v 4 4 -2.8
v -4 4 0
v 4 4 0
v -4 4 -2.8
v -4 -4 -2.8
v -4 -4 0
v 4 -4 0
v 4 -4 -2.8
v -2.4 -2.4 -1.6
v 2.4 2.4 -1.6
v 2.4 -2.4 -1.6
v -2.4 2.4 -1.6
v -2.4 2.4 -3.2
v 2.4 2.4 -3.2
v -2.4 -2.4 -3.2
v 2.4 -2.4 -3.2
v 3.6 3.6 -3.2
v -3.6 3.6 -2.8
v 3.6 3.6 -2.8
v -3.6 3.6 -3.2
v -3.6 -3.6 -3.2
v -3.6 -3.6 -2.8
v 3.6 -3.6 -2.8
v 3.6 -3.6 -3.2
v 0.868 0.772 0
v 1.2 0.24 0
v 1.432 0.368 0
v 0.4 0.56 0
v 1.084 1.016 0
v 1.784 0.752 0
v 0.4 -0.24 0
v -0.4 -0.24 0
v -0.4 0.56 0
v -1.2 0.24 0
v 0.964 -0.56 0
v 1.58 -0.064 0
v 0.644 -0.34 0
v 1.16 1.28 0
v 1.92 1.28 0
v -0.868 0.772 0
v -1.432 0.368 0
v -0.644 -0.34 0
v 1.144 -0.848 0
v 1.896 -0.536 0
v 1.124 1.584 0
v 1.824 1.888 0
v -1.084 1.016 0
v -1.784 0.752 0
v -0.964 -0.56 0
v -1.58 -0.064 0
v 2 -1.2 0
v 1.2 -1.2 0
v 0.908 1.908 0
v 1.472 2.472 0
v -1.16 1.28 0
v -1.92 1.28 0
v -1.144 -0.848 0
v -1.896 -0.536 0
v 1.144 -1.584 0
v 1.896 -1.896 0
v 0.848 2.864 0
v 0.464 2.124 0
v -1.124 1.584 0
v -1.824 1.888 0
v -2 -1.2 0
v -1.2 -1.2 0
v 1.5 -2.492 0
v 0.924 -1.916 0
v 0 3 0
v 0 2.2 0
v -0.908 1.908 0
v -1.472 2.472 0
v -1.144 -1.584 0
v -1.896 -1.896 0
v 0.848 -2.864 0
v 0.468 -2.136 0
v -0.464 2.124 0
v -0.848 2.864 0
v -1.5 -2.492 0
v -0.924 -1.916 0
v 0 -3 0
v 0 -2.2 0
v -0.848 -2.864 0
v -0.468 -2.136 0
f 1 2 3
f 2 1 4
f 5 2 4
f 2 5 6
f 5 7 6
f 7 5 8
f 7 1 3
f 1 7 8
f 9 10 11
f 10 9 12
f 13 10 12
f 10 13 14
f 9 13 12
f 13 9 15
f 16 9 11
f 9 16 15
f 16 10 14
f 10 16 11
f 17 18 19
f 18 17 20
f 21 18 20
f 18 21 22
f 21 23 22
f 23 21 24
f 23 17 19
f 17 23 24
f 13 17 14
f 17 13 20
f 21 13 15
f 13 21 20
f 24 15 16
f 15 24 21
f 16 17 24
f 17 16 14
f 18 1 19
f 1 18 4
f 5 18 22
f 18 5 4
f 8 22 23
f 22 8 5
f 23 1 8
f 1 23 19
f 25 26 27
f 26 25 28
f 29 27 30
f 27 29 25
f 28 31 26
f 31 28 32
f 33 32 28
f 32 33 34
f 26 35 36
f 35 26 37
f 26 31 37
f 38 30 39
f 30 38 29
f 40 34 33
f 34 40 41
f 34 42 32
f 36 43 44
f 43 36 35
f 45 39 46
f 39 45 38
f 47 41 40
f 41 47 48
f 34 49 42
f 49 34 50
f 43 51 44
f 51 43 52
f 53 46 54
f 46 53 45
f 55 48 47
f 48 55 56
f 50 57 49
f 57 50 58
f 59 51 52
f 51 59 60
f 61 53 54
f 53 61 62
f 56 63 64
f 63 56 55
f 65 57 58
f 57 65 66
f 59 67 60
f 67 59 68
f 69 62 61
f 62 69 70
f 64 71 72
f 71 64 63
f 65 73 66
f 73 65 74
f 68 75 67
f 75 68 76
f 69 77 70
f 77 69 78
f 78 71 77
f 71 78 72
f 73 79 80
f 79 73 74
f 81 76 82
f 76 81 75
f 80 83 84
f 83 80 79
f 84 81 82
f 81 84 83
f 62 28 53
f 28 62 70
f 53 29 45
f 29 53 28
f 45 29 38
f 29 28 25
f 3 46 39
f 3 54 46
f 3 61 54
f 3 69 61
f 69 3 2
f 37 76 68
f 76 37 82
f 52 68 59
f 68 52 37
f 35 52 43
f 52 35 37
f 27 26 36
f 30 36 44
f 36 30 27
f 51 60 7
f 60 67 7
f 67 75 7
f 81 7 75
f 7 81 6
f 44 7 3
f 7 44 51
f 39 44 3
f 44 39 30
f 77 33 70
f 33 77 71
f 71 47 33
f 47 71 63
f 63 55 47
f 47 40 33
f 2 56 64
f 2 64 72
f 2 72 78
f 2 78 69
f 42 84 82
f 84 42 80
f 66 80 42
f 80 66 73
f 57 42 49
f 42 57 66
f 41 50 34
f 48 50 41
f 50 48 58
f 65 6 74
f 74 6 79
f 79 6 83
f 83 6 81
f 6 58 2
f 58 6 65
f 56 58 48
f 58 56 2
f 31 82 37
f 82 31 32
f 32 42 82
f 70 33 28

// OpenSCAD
// file: ../p/box5.scad
use <../lib.scad>
function ldraw_lib__box5() = [
// 0 Box with 5 Faces and All Edges
// 0 Name: box5.dat
// 0 Author: James Jessiman
// 0 !LDRAW_ORG Primitive UPDATE 2012-01
// 0 !LICENSE Licensed under CC BY 2.0 and CC BY 4.0 : see CAreadme.txt
// 
// 0 BFC CERTIFY CCW
  [0,"BFC","CERTIFY"],
  [0,"BFC","CCW"],
// 
// 0 !HISTORY 2002-04-03 [sbliss] Modified for BFC compliance
// 0 !HISTORY 2002-04-25 [PTadmin] Official Update 2002-02
// 0 !HISTORY 2007-06-24 [PTadmin] Header formatted for Contributor Agreement
// 0 !HISTORY 2008-07-01 [PTadmin] Official Update 2008-01
// 0 !HISTORY 2012-02-16 [Philo] Changed to CCW
// 0 !HISTORY 2012-03-30 [PTadmin] Official Update 2012-01
// 
// 
// 2 24 1 1 1 -1 1 1
  [2,24,1,1,1,-1,1,1],
// 2 24 -1 1 1 -1 1 -1
  [2,24,-1,1,1,-1,1,-1],
// 2 24 -1 1 -1 1 1 -1
  [2,24,-1,1,-1,1,1,-1],
// 2 24 1 1 -1 1 1 1
  [2,24,1,1,-1,1,1,1],
// 2 24 1 0 1 -1 0 1
  [2,24,1,0,1,-1,0,1],
// 2 24 -1 0 1 -1 0 -1
  [2,24,-1,0,1,-1,0,-1],
// 2 24 -1 0 -1 1 0 -1
  [2,24,-1,0,-1,1,0,-1],
// 2 24 1 0 -1 1 0 1
  [2,24,1,0,-1,1,0,1],
// 2 24 1 0 1 1 1 1
  [2,24,1,0,1,1,1,1],
// 2 24 -1 0 1 -1 1 1
  [2,24,-1,0,1,-1,1,1],
// 2 24 1 0 -1 1 1 -1
  [2,24,1,0,-1,1,1,-1],
// 2 24 -1 0 -1 -1 1 -1
  [2,24,-1,0,-1,-1,1,-1],
// 4 16 -1 1 1 1 1 1 1 1 -1 -1 1 -1
  [4,16,-1,1,1,1,1,1,1,1,-1,-1,1,-1],
// 4 16 -1 1 1 -1 0 1 1 0 1 1 1 1
  [4,16,-1,1,1,-1,0,1,1,0,1,1,1,1],
// 4 16 -1 1 -1 -1 0 -1 -1 0 1 -1 1 1
  [4,16,-1,1,-1,-1,0,-1,-1,0,1,-1,1,1],
// 4 16 1 1 -1 1 0 -1 -1 0 -1 -1 1 -1
  [4,16,1,1,-1,1,0,-1,-1,0,-1,-1,1,-1],
// 4 16 1 1 1 1 0 1 1 0 -1 1 1 -1
  [4,16,1,1,1,1,0,1,1,0,-1,1,1,-1],
];
module ldraw_lib__box5(step=0, col=false, unit=2/5, alt=false, line=0.2, solid=!$preview)
    makepoly(ldraw_lib__box5(), step=step, col=col, unit=unit, alt=alt, line=line, solid=solid);
ldraw_lib__box5(line=0.2);
// file: ../p/box4.scad
use <../lib.scad>
function ldraw_lib__box4() = [
// 0 Box with 4 Faces (2 Parallel Pairs) and All Edges
// 0 Name: box4.dat
// 0 Author: James Jessiman
// 0 !LDRAW_ORG Primitive UPDATE 2012-01
// 0 !LICENSE Licensed under CC BY 2.0 and CC BY 4.0 : see CAreadme.txt
// 
// 0 BFC CERTIFY CCW
  [0,"BFC","CERTIFY"],
  [0,"BFC","CCW"],
// 
// 0 !HISTORY 2002-04-03 [sbliss] Modified for BFC compliance
// 0 !HISTORY 2002-04-25 [PTadmin] Official Update 2002-02
// 0 !HISTORY 2007-06-24 [PTadmin] Header formatted for Contributor Agreement
// 0 !HISTORY 2008-07-01 [PTadmin] Official Update 2008-01
// 0 !HISTORY 2012-02-16 [Philo] Changed to CCW
// 0 !HISTORY 2012-03-30 [PTadmin] Official Update 2012-01
// 
// 
// 2 24 1 1 1 -1 1 1
  [2,24,1,1,1,-1,1,1],
// 2 24 -1 1 1 -1 1 -1
  [2,24,-1,1,1,-1,1,-1],
// 2 24 -1 1 -1 1 1 -1
  [2,24,-1,1,-1,1,1,-1],
// 2 24 1 1 -1 1 1 1
  [2,24,1,1,-1,1,1,1],
// 2 24 1 0 1 -1 0 1
  [2,24,1,0,1,-1,0,1],
// 2 24 -1 0 1 -1 0 -1
  [2,24,-1,0,1,-1,0,-1],
// 2 24 -1 0 -1 1 0 -1
  [2,24,-1,0,-1,1,0,-1],
// 2 24 1 0 -1 1 0 1
  [2,24,1,0,-1,1,0,1],
// 2 24 1 0 1 1 1 1
  [2,24,1,0,1,1,1,1],
// 2 24 -1 0 1 -1 1 1
  [2,24,-1,0,1,-1,1,1],
// 2 24 1 0 -1 1 1 -1
  [2,24,1,0,-1,1,1,-1],
// 2 24 -1 0 -1 -1 1 -1
  [2,24,-1,0,-1,-1,1,-1],
// 4 16 -1 1 1 -1 0 1 1 0 1 1 1 1
  [4,16,-1,1,1,-1,0,1,1,0,1,1,1,1],
// 4 16 -1 1 -1 -1 0 -1 -1 0 1 -1 1 1
  [4,16,-1,1,-1,-1,0,-1,-1,0,1,-1,1,1],
// 4 16 1 1 -1 1 0 -1 -1 0 -1 -1 1 -1
  [4,16,1,1,-1,1,0,-1,-1,0,-1,-1,1,-1],
// 4 16 1 1 1 1 0 1 1 0 -1 1 1 -1
  [4,16,1,1,1,1,0,1,1,0,-1,1,1,-1],
];
module ldraw_lib__box4(step=0, col=false, unit=2/5, alt=false, line=0.2, solid=!$preview)
    makepoly(ldraw_lib__box4(), step=step, col=col, unit=unit, alt=alt, line=line, solid=solid);
ldraw_lib__box4(line=0.2);
// file: s/3070bs01.scad
use <../../lib.scad>
use <../../p/box4.scad>
use <../../p/box5.scad>
function ldraw_lib__s__3070bs01() = [
// 0 ~Tile  1 x  1 with Groove without Top Face
// 0 Name: s\3070bs01.dat
// 0 Author: Chris Dee [cwdee]
// 0 !LDRAW_ORG Subpart UPDATE 2009-02
// 0 !LICENSE Licensed under CC BY 2.0 and CC BY 4.0 : see CAreadme.txt
// 
// 0 BFC CERTIFY CCW
  [0,"BFC","CERTIFY"],
  [0,"BFC","CCW"],
// 
// 0 !HISTORY 2009-09-03 [PTadmin] Official Update 2009-02
// 
// 
// 1 16 0 0 0 10 0 0 0 7 0 0 0 10 box4.dat
  [1,16,0,0,0,10,0,0,0,7,0,0,0,10, ldraw_lib__box4()],
// 0 BFC INVERTNEXT
  [0,"BFC","INVERTNEXT"],
// 1 16 0 8 0 6 0 0 0 -4 0 0 0 6 box5.dat
  [1,16,0,8,0,6,0,0,0,-4,0,0,0,6, ldraw_lib__box5()],
// 1 16 0 7 0 9 0 0 0 1 0 0 0 9 box4.dat
  [1,16,0,7,0,9,0,0,0,1,0,0,0,9, ldraw_lib__box4()],
// 
// 4 16 9 8 9 6 8 6 -6 8 6 -9 8 9
  [4,16,9,8,9,6,8,6,-6,8,6,-9,8,9],
// 4 16 -9 8 9 -6 8 6 -6 8 -6 -9 8 -9
  [4,16,-9,8,9,-6,8,6,-6,8,-6,-9,8,-9],
// 4 16 -9 8 -9 -6 8 -6 6 8 -6 9 8 -9
  [4,16,-9,8,-9,-6,8,-6,6,8,-6,9,8,-9],
// 4 16 9 8 -9 6 8 -6 6 8 6 9 8 9
  [4,16,9,8,-9,6,8,-6,6,8,6,9,8,9],
// 
// 4 16 10 7 10 9 7 9 -9 7 9 -10 7 10
  [4,16,10,7,10,9,7,9,-9,7,9,-10,7,10],
// 4 16 -10 7 10 -9 7 9 -9 7 -9 -10 7 -10
  [4,16,-10,7,10,-9,7,9,-9,7,-9,-10,7,-10],
// 4 16 -10 7 -10 -9 7 -9 9 7 -9 10 7 -10
  [4,16,-10,7,-10,-9,7,-9,9,7,-9,10,7,-10],
// 4 16 10 7 -10 9 7 -9 9 7 9 10 7 10
  [4,16,10,7,-10,9,7,-9,9,7,9,10,7,10],
// 0
];
module ldraw_lib__s__3070bs01(step=0, col=false, unit=2/5, alt=false, line=0.2, solid=!$preview)
    makepoly(ldraw_lib__s__3070bs01(), step=step, col=col, unit=unit, alt=alt, line=line, solid=solid);
ldraw_lib__s__3070bs01(line=0.2);
// main file
use <../lib.scad>
use <s/3070bs01.scad>
function ldraw_lib__3070bpv8() = [
// 0 Tile  1 x  1 with Silver "8" Pattern
// 0 Name: 3070bpv8.dat
// 0 Author: Magnus Forsberg [MagFors]
// 0 !LDRAW_ORG Part UPDATE 2015-02
// 0 !LICENSE Licensed under CC BY 2.0 and CC BY 4.0 : see CAreadme.txt
// 
// 0 BFC CERTIFY CCW
  [0,"BFC","CERTIFY"],
  [0,"BFC","CCW"],
// 
// 0 !HISTORY 2015-12-30 [PTadmin] Official Update 2015-02
// 
// 
// 1 16 0 0 0 1 0 0 0 1 0 0 0 1 s\3070bs01.dat
  [1,16,0,0,0,1,0,0,0,1,0,0,0,1, ldraw_lib__s__3070bs01()],
// 
// 4 80 2.17 0 1.93 1 0 1.4 3 0 0.6 3.58 0 0.92
  [4,80,2.17,0,1.93,1,0,1.4,3,0,0.6,3.58,0,0.92],
// 4 80 2.71 0 2.54 2.17 0 1.93 3.58 0 0.92 4.46 0 1.88
  [4,80,2.71,0,2.54,2.17,0,1.93,3.58,0,0.92,4.46,0,1.88],
// 4 80 1 0 -0.6 3 0 0.6 1 0 1.4 -1 0 -0.6
  [4,80,1,0,-0.6,3,0,0.6,1,0,1.4,-1,0,-0.6],
// 4 80 -1 0 -0.6 1 0 1.4 -1 0 1.4 -3 0 0.6
  [4,80,-1,0,-0.6,1,0,1.4,-1,0,1.4,-3,0,0.6],
// 4 80 3 0 0.6 1.61 0 -0.85 2.41 0 -1.4 3.95 0 -0.16
  [4,80,3,0,0.6,1.61,0,-0.85,2.41,0,-1.4,3.95,0,-0.16],
// 3 80 3 0 0.6 1 0 -0.6 1.61 0 -0.85
  [3,80,3,0,0.6,1,0,-0.6,1.61,0,-0.85],
// 4 80 2.9 0 3.2 2.71 0 2.54 4.46 0 1.88 4.8 0 3.2
  [4,80,2.9,0,3.2,2.71,0,2.54,4.46,0,1.88,4.8,0,3.2],
// 4 80 -3 0 0.6 -1 0 1.4 -2.17 0 1.93 -3.58 0 0.92
  [4,80,-3,0,0.6,-1,0,1.4,-2.17,0,1.93,-3.58,0,0.92],
// 3 80 -3 0 0.6 -1.61 0 -0.85 -1 0 -0.6
  [3,80,-3,0,0.6,-1.61,0,-0.85,-1,0,-0.6],
// 4 80 3.95 0 -0.16 2.41 0 -1.4 2.86 0 -2.12 4.74 0 -1.34
  [4,80,3.95,0,-0.16,2.41,0,-1.4,2.86,0,-2.12,4.74,0,-1.34],
// 4 80 2.81 0 3.96 2.9 0 3.2 4.8 0 3.2 4.56 0 4.72
  [4,80,2.81,0,3.96,2.9,0,3.2,4.8,0,3.2,4.56,0,4.72],
// 4 80 -3.58 0 0.92 -2.17 0 1.93 -2.71 0 2.54 -4.46 0 1.88
  [4,80,-3.58,0,0.92,-2.17,0,1.93,-2.71,0,2.54,-4.46,0,1.88],
// 4 80 -2.41 0 -1.4 -1.61 0 -0.85 -3 0 0.6 -3.95 0 -0.16
  [4,80,-2.41,0,-1.4,-1.61,0,-0.85,-3,0,0.6,-3.95,0,-0.16],
// 4 80 4.74 0 -1.34 2.86 0 -2.12 3 0 -3 5 0 -3
  [4,80,4.74,0,-1.34,2.86,0,-2.12,3,0,-3,5,0,-3],
// 4 80 2.27 0 4.77 2.81 0 3.96 4.56 0 4.72 3.68 0 6.18
  [4,80,2.27,0,4.77,2.81,0,3.96,4.56,0,4.72,3.68,0,6.18],
// 4 80 -4.46 0 1.88 -2.71 0 2.54 -2.9 0 3.2 -4.8 0 3.2
  [4,80,-4.46,0,1.88,-2.71,0,2.54,-2.9,0,3.2,-4.8,0,3.2],
// 4 80 -2.86 0 -2.12 -2.41 0 -1.4 -3.95 0 -0.16 -4.74 0 -1.34
  [4,80,-2.86,0,-2.12,-2.41,0,-1.4,-3.95,0,-0.16,-4.74,0,-1.34],
// 4 80 5 0 -3 3 0 -3 2.86 0 -3.96 4.74 0 -4.74
  [4,80,5,0,-3,3,0,-3,2.86,0,-3.96,4.74,0,-4.74],
// 4 80 1.16 0 5.31 2.27 0 4.77 3.68 0 6.18 2.12 0 7.16
  [4,80,1.16,0,5.31,2.27,0,4.77,3.68,0,6.18,2.12,0,7.16],
// 4 80 -4.8 0 3.2 -2.9 0 3.2 -2.81 0 3.96 -4.56 0 4.72
  [4,80,-4.8,0,3.2,-2.9,0,3.2,-2.81,0,3.96,-4.56,0,4.72],
// 4 80 -3 0 -3 -2.86 0 -2.12 -4.74 0 -1.34 -5 0 -3
  [4,80,-3,0,-3,-2.86,0,-2.12,-4.74,0,-1.34,-5,0,-3],
// 4 80 4.74 0 -4.74 2.86 0 -3.96 2.31 0 -4.79 3.75 0 -6.23
  [4,80,4.74,0,-4.74,2.86,0,-3.96,2.31,0,-4.79,3.75,0,-6.23],
// 4 80 0 0 5.5 1.16 0 5.31 2.12 0 7.16 0 0 7.5
  [4,80,0,0,5.5,1.16,0,5.31,2.12,0,7.16,0,0,7.5],
// 4 80 -4.56 0 4.72 -2.81 0 3.96 -2.27 0 4.77 -3.68 0 6.18
  [4,80,-4.56,0,4.72,-2.81,0,3.96,-2.27,0,4.77,-3.68,0,6.18],
// 4 80 -2.86 0 -3.96 -3 0 -3 -5 0 -3 -4.74 0 -4.74
  [4,80,-2.86,0,-3.96,-3,0,-3,-5,0,-3,-4.74,0,-4.74],
// 4 80 3.75 0 -6.23 2.31 0 -4.79 1.17 0 -5.34 2.12 0 -7.16
  [4,80,3.75,0,-6.23,2.31,0,-4.79,1.17,0,-5.34,2.12,0,-7.16],
// 4 80 -2.12 0 7.16 -1.16 0 5.31 0 0 5.5 0 0 7.5
  [4,80,-2.12,0,7.16,-1.16,0,5.31,0,0,5.5,0,0,7.5],
// 4 80 -3.68 0 6.18 -2.27 0 4.77 -1.16 0 5.31 -2.12 0 7.16
  [4,80,-3.68,0,6.18,-2.27,0,4.77,-1.16,0,5.31,-2.12,0,7.16],
// 4 80 -2.31 0 -4.79 -2.86 0 -3.96 -4.74 0 -4.74 -3.75 0 -6.23
  [4,80,-2.31,0,-4.79,-2.86,0,-3.96,-4.74,0,-4.74,-3.75,0,-6.23],
// 4 80 2.12 0 -7.16 1.17 0 -5.34 0 0 -5.5 0 0 -7.5
  [4,80,2.12,0,-7.16,1.17,0,-5.34,0,0,-5.5,0,0,-7.5],
// 4 80 -1.17 0 -5.34 -2.31 0 -4.79 -3.75 0 -6.23 -2.12 0 -7.16
  [4,80,-1.17,0,-5.34,-2.31,0,-4.79,-3.75,0,-6.23,-2.12,0,-7.16],
// 4 80 0 0 -5.5 -1.17 0 -5.34 -2.12 0 -7.16 0 0 -7.5
  [4,80,0,0,-5.5,-1.17,0,-5.34,-2.12,0,-7.16,0,0,-7.5],
// 
// 4 16 1.16 0 5.31 0 0 5.5 1 0 1.4 2.27 0 4.77
  [4,16,1.16,0,5.31,0,0,5.5,1,0,1.4,2.27,0,4.77],
// 4 16 2.81 0 3.96 2.27 0 4.77 1 0 1.4 2.71 0 2.54
  [4,16,2.81,0,3.96,2.27,0,4.77,1,0,1.4,2.71,0,2.54],
// 3 16 2.81 0 3.96 2.71 0 2.54 2.9 0 3.2
  [3,16,2.81,0,3.96,2.71,0,2.54,2.9,0,3.2],
// 3 16 2.71 0 2.54 1 0 1.4 2.17 0 1.93
  [3,16,2.71,0,2.54,1,0,1.4,2.17,0,1.93],
// 3 16 10 0 10 4.56 0 4.72 4.8 0 3.2
  [3,16,10,0,10,4.56,0,4.72,4.8,0,3.2],
// 3 16 10 0 10 3.68 0 6.18 4.56 0 4.72
  [3,16,10,0,10,3.68,0,6.18,4.56,0,4.72],
// 3 16 10 0 10 2.12 0 7.16 3.68 0 6.18
  [3,16,10,0,10,2.12,0,7.16,3.68,0,6.18],
// 4 16 0 0 7.5 2.12 0 7.16 10 0 10 -10 0 10
  [4,16,0,0,7.5,2.12,0,7.16,10,0,10,-10,0,10],
// 4 16 1.61 0 -0.85 0 0 -5.5 1.17 0 -5.34 2.31 0 -4.79
  [4,16,1.61,0,-0.85,0,0,-5.5,1.17,0,-5.34,2.31,0,-4.79],
// 4 16 1.61 0 -0.85 2.31 0 -4.79 2.86 0 -3.96 3 0 -3
  [4,16,1.61,0,-0.85,2.31,0,-4.79,2.86,0,-3.96,3,0,-3],
// 4 16 1.61 0 -0.85 3 0 -3 2.86 0 -2.12 2.41 0 -1.4
  [4,16,1.61,0,-0.85,3,0,-3,2.86,0,-2.12,2.41,0,-1.4],
// 3 16 3.58 0 0.92 3 0 0.6 3.95 0 -0.16
  [3,16,3.58,0,0.92,3,0,0.6,3.95,0,-0.16],
// 4 16 4.46 0 1.88 3.58 0 0.92 3.95 0 -0.16 4.74 0 -1.34
  [4,16,4.46,0,1.88,3.58,0,0.92,3.95,0,-0.16,4.74,0,-1.34],
// 3 16 5 0 -3 4.74 0 -4.74 10 0 -10
  [3,16,5,0,-3,4.74,0,-4.74,10,0,-10],
// 3 16 4.74 0 -4.74 3.75 0 -6.23 10 0 -10
  [3,16,4.74,0,-4.74,3.75,0,-6.23,10,0,-10],
// 3 16 3.75 0 -6.23 2.12 0 -7.16 10 0 -10
  [3,16,3.75,0,-6.23,2.12,0,-7.16,10,0,-10],
// 4 16 10 0 -10 2.12 0 -7.16 0 0 -7.5 -10 0 -10
  [4,16,10,0,-10,2.12,0,-7.16,0,0,-7.5,-10,0,-10],
// 4 16 4.74 0 -1.34 5 0 -3 10 0 -10 10 0 10
  [4,16,4.74,0,-1.34,5,0,-3,10,0,-10,10,0,10],
// 4 16 10 0 10 4.8 0 3.2 4.46 0 1.88 4.74 0 -1.34
  [4,16,10,0,10,4.8,0,3.2,4.46,0,1.88,4.74,0,-1.34],
// 4 16 -1 0 1.4 0 0 5.5 -1.16 0 5.31 -2.27 0 4.77
  [4,16,-1,0,1.4,0,0,5.5,-1.16,0,5.31,-2.27,0,4.77],
// 4 16 -1 0 1.4 -2.27 0 4.77 -2.81 0 3.96 -2.71 0 2.54
  [4,16,-1,0,1.4,-2.27,0,4.77,-2.81,0,3.96,-2.71,0,2.54],
// 3 16 -2.81 0 3.96 -2.9 0 3.2 -2.71 0 2.54
  [3,16,-2.81,0,3.96,-2.9,0,3.2,-2.71,0,2.54],
// 3 16 -2.71 0 2.54 -2.17 0 1.93 -1 0 1.4
  [3,16,-2.71,0,2.54,-2.17,0,1.93,-1,0,1.4],
// 3 16 -10 0 10 -4.8 0 3.2 -4.56 0 4.72
  [3,16,-10,0,10,-4.8,0,3.2,-4.56,0,4.72],
// 3 16 -10 0 10 -4.56 0 4.72 -3.68 0 6.18
  [3,16,-10,0,10,-4.56,0,4.72,-3.68,0,6.18],
// 3 16 -10 0 10 -3.68 0 6.18 -2.12 0 7.16
  [3,16,-10,0,10,-3.68,0,6.18,-2.12,0,7.16],
// 3 16 -10 0 10 -2.12 0 7.16 0 0 7.5
  [3,16,-10,0,10,-2.12,0,7.16,0,0,7.5],
// 4 16 -1.17 0 -5.34 0 0 -5.5 -1.61 0 -0.85 -2.31 0 -4.79
  [4,16,-1.17,0,-5.34,0,0,-5.5,-1.61,0,-0.85,-2.31,0,-4.79],
// 4 16 -2.86 0 -3.96 -2.31 0 -4.79 -1.61 0 -0.85 -3 0 -3
  [4,16,-2.86,0,-3.96,-2.31,0,-4.79,-1.61,0,-0.85,-3,0,-3],
// 4 16 -2.86 0 -2.12 -3 0 -3 -1.61 0 -0.85 -2.41 0 -1.4
  [4,16,-2.86,0,-2.12,-3,0,-3,-1.61,0,-0.85,-2.41,0,-1.4],
// 3 16 -3.58 0 0.92 -3.95 0 -0.16 -3 0 0.6
  [3,16,-3.58,0,0.92,-3.95,0,-0.16,-3,0,0.6],
// 4 16 -3.95 0 -0.16 -3.58 0 0.92 -4.46 0 1.88 -4.74 0 -1.34
  [4,16,-3.95,0,-0.16,-3.58,0,0.92,-4.46,0,1.88,-4.74,0,-1.34],
// 3 16 -5 0 -3 -10 0 -10 -4.74 0 -4.74
  [3,16,-5,0,-3,-10,0,-10,-4.74,0,-4.74],
// 3 16 -4.74 0 -4.74 -10 0 -10 -3.75 0 -6.23
  [3,16,-4.74,0,-4.74,-10,0,-10,-3.75,0,-6.23],
// 3 16 -3.75 0 -6.23 -10 0 -10 -2.12 0 -7.16
  [3,16,-3.75,0,-6.23,-10,0,-10,-2.12,0,-7.16],
// 3 16 -2.12 0 -7.16 -10 0 -10 0 0 -7.5
  [3,16,-2.12,0,-7.16,-10,0,-10,0,0,-7.5],
// 4 16 -10 0 -10 -5 0 -3 -4.74 0 -1.34 -10 0 10
  [4,16,-10,0,-10,-5,0,-3,-4.74,0,-1.34,-10,0,10],
// 4 16 -4.46 0 1.88 -4.8 0 3.2 -10 0 10 -4.74 0 -1.34
  [4,16,-4.46,0,1.88,-4.8,0,3.2,-10,0,10,-4.74,0,-1.34],
// 4 16 1 0 -0.6 -1 0 -0.6 0 0 -5.5 1.61 0 -0.85
  [4,16,1,0,-0.6,-1,0,-0.6,0,0,-5.5,1.61,0,-0.85],
// 3 16 -1 0 -0.6 -1.61 0 -0.85 0 0 -5.5
  [3,16,-1,0,-0.6,-1.61,0,-0.85,0,0,-5.5],
// 3 16 0 0 5.5 -1 0 1.4 1 0 1.4
  [3,16,0,0,5.5,-1,0,1.4,1,0,1.4],
];
module ldraw_lib__3070bpv8(step=0, col=false, unit=2/5, alt=false, line=0.2, solid=!$preview)
    makepoly(ldraw_lib__3070bpv8(), step=step, col=col, unit=unit, alt=alt, line=line, solid=solid);
ldraw_lib__3070bpv8(line=0.2);
